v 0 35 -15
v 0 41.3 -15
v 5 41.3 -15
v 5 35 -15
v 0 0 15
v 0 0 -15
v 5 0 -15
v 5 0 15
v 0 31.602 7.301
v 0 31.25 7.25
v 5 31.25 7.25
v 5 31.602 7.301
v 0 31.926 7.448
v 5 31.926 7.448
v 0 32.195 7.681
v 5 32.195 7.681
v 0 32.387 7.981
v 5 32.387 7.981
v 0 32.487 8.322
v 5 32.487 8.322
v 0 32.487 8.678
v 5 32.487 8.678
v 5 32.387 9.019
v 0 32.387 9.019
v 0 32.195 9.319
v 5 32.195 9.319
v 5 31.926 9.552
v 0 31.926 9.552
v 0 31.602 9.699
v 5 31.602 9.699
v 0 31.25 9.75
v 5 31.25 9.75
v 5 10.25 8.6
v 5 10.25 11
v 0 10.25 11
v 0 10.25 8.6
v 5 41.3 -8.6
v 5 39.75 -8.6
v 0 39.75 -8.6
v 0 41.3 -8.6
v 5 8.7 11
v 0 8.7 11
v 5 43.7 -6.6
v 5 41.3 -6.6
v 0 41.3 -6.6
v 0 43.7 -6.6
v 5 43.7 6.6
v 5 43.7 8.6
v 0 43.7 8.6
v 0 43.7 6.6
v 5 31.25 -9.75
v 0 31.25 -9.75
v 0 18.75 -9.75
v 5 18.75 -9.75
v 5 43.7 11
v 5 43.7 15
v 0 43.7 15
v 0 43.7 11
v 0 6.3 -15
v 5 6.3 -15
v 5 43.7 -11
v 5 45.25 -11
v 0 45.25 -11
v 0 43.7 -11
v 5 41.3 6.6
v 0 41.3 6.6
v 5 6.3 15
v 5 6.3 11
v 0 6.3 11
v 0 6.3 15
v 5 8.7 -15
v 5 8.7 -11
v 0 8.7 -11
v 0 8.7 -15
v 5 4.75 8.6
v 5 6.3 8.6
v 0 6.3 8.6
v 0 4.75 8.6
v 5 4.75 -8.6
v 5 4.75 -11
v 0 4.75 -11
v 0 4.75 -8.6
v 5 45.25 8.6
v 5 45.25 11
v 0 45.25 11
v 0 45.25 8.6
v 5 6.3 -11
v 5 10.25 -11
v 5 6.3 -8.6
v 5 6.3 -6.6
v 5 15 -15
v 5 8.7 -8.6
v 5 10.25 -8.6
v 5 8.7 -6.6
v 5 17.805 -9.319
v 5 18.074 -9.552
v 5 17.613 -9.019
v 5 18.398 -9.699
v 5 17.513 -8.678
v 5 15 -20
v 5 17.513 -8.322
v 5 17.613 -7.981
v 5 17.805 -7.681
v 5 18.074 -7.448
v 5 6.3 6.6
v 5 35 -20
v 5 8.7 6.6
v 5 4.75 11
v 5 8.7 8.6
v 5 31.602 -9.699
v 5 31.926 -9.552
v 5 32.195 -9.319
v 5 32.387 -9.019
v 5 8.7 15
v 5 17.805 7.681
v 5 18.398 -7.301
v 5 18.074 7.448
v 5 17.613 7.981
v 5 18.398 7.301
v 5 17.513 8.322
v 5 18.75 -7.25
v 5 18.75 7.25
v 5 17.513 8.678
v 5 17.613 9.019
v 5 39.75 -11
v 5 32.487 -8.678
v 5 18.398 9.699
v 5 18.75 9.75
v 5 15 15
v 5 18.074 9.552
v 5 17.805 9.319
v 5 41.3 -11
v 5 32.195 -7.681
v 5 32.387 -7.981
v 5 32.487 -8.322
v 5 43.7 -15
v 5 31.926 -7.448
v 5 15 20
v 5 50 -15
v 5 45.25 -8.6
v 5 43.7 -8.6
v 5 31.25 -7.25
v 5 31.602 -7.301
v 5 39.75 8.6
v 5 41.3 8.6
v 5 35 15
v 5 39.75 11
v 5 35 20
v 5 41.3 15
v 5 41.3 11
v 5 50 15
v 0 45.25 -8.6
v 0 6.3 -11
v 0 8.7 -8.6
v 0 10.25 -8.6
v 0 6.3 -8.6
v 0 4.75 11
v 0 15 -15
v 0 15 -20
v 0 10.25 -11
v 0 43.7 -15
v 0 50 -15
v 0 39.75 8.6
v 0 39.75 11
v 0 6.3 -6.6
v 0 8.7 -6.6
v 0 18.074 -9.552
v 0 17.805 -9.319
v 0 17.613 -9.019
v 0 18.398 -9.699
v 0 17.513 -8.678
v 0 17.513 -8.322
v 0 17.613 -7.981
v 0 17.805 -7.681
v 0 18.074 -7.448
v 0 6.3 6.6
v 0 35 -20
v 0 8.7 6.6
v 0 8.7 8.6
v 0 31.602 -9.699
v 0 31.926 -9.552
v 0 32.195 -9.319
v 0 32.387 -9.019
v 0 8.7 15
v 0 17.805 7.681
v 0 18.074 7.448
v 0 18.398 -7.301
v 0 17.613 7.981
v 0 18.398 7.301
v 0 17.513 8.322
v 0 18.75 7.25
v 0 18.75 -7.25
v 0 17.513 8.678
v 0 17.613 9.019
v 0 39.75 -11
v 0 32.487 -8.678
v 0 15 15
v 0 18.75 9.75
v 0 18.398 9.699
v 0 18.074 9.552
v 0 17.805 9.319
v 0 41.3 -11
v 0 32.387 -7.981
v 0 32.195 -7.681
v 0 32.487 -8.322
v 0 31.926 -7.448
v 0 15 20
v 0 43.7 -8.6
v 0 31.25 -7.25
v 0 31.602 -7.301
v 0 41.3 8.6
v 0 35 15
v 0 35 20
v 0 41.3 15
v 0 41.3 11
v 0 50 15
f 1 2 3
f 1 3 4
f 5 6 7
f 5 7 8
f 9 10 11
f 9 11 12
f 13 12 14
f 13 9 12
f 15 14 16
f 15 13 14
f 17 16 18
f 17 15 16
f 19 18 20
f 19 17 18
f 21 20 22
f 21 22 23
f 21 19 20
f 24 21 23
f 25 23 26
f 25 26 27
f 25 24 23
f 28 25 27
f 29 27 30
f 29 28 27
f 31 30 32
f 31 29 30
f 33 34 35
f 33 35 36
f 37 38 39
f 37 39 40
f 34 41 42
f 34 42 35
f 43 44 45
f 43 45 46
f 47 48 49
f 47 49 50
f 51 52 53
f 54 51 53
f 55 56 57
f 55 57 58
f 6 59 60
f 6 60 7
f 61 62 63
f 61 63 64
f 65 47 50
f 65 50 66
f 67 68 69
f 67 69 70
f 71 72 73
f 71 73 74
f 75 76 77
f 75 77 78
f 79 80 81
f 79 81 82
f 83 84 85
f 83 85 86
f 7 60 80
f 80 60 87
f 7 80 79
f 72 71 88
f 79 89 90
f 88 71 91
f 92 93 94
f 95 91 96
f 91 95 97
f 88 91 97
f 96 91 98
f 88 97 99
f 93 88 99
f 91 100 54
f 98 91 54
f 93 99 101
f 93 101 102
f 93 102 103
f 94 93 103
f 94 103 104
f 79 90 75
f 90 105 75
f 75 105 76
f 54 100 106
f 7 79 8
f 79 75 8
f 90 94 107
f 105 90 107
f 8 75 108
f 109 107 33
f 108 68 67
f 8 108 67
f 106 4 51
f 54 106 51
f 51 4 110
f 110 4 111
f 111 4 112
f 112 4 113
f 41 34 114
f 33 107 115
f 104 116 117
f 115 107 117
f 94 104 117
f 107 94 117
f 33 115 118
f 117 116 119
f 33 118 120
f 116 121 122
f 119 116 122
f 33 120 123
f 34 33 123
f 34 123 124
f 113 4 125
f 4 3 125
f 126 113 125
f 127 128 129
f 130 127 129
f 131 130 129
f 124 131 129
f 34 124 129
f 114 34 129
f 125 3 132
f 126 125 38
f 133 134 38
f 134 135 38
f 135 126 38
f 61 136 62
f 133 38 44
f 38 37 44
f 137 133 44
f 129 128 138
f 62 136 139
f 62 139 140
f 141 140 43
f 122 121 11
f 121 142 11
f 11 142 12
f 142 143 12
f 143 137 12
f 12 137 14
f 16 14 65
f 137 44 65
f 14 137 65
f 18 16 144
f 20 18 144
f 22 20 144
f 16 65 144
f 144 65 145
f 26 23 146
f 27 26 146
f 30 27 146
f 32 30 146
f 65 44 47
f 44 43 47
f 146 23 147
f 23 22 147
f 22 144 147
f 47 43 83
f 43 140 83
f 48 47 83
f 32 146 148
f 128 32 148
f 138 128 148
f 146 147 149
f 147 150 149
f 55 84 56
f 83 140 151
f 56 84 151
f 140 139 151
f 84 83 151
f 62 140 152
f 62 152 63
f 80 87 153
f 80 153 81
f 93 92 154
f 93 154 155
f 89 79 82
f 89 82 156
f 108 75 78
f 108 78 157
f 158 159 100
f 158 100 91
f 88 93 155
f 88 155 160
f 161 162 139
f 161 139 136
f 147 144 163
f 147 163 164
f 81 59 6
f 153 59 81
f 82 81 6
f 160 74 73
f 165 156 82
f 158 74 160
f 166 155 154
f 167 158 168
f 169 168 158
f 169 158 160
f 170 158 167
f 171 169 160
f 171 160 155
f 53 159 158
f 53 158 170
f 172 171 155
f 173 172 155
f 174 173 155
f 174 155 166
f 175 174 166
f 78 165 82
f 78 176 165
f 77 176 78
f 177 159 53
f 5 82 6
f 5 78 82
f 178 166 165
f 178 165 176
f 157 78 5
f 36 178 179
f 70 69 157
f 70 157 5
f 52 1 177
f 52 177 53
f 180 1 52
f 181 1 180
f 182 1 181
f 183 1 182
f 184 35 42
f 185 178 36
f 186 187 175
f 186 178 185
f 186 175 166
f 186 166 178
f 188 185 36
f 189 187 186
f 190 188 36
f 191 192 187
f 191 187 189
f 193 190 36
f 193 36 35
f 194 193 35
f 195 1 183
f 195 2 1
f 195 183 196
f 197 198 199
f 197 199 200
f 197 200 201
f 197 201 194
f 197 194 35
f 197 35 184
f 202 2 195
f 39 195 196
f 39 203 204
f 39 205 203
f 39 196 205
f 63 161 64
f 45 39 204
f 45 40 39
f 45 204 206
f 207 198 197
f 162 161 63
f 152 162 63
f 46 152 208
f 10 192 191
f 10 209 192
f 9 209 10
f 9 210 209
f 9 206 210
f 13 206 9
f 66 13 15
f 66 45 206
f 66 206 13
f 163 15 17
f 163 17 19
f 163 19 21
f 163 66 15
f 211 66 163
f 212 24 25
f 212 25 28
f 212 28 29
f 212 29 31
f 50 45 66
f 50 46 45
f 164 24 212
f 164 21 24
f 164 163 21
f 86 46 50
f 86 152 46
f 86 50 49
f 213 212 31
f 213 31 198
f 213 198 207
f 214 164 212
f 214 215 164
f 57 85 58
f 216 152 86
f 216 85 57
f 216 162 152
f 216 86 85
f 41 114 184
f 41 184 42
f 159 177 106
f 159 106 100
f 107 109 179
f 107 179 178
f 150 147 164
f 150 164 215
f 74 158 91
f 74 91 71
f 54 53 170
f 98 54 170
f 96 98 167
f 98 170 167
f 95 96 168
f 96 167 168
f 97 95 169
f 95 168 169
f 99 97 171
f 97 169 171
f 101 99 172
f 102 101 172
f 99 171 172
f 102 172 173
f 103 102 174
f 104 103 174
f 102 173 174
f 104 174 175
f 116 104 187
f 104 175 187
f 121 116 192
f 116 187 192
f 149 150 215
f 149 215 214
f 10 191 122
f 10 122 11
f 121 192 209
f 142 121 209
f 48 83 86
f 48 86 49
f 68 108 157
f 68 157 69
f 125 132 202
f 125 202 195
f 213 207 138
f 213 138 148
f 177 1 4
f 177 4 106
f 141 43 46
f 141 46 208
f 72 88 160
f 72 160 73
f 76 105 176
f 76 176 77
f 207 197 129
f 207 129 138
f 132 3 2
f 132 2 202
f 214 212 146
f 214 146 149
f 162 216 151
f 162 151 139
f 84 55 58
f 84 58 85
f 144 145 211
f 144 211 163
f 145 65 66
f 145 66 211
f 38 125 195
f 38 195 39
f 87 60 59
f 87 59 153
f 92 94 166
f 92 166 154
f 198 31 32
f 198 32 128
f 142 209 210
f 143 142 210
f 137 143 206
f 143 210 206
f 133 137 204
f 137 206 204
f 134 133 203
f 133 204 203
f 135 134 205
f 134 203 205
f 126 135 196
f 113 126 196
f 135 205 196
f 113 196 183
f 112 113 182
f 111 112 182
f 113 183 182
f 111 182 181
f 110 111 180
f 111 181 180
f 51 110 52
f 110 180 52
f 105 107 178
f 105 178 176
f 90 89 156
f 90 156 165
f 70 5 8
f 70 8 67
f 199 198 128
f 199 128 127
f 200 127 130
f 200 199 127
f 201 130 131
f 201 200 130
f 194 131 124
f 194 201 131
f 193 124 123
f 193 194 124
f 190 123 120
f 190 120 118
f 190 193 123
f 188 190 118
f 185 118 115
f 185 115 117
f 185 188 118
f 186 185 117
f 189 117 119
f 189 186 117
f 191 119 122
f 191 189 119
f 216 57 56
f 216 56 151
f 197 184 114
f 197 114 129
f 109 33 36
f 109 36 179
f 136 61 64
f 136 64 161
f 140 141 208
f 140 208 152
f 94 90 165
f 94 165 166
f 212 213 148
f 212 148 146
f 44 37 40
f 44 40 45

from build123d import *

# Parameters (mm, degrees)
BOSS_EXTRUDE1_DEPTH = 5
CUT_EXTRUDE1_DEPTH  = 6


with BuildPart() as part:
    # Sketch1 → Boss-Extrude1 (new body)
    with BuildSketch(Plane(origin=(0, 0, 0), x_dir=(0, 0, -1), z_dir=(1, 0, 0))):
        Polygon((-15, 50), (15, 50), (15, 35), (20, 35), (20, 15), (15, 15), (15, 0), (-15, 0), (-15, 15), (-20, 15), (-20, 35), (-15, 35), align=None)
        with BuildLine():
            Line((9.75, 31.25), (9.75, 18.75))
            ThreePointArc((9.75, 18.75), (8.5, 17.5), (7.25, 18.75))
            Line((7.25, 18.75), (7.25, 31.25))
            ThreePointArc((7.25, 31.25), (8.5, 32.5), (9.75, 31.25))
        make_face(mode=Mode.SUBTRACT)
        with BuildLine():
            Line((-9.75, 31.25), (-9.75, 18.75))
            ThreePointArc((-9.75, 18.75), (-8.5, 17.5), (-7.25, 18.75))
            Line((-7.25, 18.75), (-7.25, 31.25))
            ThreePointArc((-7.25, 31.25), (-8.5, 32.5), (-9.75, 31.25))
        make_face(mode=Mode.SUBTRACT)
    extrude(amount=BOSS_EXTRUDE1_DEPTH)

    # Sketch2 → Cut-Extrude1 (cut, through all)
    with BuildSketch(Plane(origin=(5, 0, 0), x_dir=(0, 0, -1), z_dir=(1, 0, 0))):
        Polygon((-15, 43.7), (-11, 43.7), (-11, 45.25), (-8.6, 45.25), (-8.6, 43.7), (-6.6, 43.7), (-6.6, 41.3), (-8.6, 41.3), (-8.6, 39.75), (-11, 39.75), (-11, 41.3), (-15, 41.3), align=None)
        Polygon((15, 41.3), (11, 41.3), (11, 39.75), (8.6, 39.75), (8.6, 41.3), (6.6, 41.3), (6.6, 43.7), (8.6, 43.7), (8.6, 45.25), (11, 45.25), (11, 43.7), (15, 43.7), align=None)
        Polygon((-15, 8.7), (-11, 8.7), (-11, 10.25), (-8.6, 10.25), (-8.6, 8.7), (-6.6, 8.7), (-6.6, 6.3), (-8.6, 6.3), (-8.6, 4.75), (-11, 4.75), (-11, 6.3), (-15, 6.3), align=None)
        Polygon((15, 6.3), (11, 6.3), (11, 4.75), (8.6, 4.75), (8.6, 6.3), (6.6, 6.3), (6.6, 8.7), (8.6, 8.7), (8.6, 10.25), (11, 10.25), (11, 8.7), (15, 8.7), align=None)
    extrude(amount=-CUT_EXTRUDE1_DEPTH, mode=Mode.SUBTRACT)


solid = part.part
